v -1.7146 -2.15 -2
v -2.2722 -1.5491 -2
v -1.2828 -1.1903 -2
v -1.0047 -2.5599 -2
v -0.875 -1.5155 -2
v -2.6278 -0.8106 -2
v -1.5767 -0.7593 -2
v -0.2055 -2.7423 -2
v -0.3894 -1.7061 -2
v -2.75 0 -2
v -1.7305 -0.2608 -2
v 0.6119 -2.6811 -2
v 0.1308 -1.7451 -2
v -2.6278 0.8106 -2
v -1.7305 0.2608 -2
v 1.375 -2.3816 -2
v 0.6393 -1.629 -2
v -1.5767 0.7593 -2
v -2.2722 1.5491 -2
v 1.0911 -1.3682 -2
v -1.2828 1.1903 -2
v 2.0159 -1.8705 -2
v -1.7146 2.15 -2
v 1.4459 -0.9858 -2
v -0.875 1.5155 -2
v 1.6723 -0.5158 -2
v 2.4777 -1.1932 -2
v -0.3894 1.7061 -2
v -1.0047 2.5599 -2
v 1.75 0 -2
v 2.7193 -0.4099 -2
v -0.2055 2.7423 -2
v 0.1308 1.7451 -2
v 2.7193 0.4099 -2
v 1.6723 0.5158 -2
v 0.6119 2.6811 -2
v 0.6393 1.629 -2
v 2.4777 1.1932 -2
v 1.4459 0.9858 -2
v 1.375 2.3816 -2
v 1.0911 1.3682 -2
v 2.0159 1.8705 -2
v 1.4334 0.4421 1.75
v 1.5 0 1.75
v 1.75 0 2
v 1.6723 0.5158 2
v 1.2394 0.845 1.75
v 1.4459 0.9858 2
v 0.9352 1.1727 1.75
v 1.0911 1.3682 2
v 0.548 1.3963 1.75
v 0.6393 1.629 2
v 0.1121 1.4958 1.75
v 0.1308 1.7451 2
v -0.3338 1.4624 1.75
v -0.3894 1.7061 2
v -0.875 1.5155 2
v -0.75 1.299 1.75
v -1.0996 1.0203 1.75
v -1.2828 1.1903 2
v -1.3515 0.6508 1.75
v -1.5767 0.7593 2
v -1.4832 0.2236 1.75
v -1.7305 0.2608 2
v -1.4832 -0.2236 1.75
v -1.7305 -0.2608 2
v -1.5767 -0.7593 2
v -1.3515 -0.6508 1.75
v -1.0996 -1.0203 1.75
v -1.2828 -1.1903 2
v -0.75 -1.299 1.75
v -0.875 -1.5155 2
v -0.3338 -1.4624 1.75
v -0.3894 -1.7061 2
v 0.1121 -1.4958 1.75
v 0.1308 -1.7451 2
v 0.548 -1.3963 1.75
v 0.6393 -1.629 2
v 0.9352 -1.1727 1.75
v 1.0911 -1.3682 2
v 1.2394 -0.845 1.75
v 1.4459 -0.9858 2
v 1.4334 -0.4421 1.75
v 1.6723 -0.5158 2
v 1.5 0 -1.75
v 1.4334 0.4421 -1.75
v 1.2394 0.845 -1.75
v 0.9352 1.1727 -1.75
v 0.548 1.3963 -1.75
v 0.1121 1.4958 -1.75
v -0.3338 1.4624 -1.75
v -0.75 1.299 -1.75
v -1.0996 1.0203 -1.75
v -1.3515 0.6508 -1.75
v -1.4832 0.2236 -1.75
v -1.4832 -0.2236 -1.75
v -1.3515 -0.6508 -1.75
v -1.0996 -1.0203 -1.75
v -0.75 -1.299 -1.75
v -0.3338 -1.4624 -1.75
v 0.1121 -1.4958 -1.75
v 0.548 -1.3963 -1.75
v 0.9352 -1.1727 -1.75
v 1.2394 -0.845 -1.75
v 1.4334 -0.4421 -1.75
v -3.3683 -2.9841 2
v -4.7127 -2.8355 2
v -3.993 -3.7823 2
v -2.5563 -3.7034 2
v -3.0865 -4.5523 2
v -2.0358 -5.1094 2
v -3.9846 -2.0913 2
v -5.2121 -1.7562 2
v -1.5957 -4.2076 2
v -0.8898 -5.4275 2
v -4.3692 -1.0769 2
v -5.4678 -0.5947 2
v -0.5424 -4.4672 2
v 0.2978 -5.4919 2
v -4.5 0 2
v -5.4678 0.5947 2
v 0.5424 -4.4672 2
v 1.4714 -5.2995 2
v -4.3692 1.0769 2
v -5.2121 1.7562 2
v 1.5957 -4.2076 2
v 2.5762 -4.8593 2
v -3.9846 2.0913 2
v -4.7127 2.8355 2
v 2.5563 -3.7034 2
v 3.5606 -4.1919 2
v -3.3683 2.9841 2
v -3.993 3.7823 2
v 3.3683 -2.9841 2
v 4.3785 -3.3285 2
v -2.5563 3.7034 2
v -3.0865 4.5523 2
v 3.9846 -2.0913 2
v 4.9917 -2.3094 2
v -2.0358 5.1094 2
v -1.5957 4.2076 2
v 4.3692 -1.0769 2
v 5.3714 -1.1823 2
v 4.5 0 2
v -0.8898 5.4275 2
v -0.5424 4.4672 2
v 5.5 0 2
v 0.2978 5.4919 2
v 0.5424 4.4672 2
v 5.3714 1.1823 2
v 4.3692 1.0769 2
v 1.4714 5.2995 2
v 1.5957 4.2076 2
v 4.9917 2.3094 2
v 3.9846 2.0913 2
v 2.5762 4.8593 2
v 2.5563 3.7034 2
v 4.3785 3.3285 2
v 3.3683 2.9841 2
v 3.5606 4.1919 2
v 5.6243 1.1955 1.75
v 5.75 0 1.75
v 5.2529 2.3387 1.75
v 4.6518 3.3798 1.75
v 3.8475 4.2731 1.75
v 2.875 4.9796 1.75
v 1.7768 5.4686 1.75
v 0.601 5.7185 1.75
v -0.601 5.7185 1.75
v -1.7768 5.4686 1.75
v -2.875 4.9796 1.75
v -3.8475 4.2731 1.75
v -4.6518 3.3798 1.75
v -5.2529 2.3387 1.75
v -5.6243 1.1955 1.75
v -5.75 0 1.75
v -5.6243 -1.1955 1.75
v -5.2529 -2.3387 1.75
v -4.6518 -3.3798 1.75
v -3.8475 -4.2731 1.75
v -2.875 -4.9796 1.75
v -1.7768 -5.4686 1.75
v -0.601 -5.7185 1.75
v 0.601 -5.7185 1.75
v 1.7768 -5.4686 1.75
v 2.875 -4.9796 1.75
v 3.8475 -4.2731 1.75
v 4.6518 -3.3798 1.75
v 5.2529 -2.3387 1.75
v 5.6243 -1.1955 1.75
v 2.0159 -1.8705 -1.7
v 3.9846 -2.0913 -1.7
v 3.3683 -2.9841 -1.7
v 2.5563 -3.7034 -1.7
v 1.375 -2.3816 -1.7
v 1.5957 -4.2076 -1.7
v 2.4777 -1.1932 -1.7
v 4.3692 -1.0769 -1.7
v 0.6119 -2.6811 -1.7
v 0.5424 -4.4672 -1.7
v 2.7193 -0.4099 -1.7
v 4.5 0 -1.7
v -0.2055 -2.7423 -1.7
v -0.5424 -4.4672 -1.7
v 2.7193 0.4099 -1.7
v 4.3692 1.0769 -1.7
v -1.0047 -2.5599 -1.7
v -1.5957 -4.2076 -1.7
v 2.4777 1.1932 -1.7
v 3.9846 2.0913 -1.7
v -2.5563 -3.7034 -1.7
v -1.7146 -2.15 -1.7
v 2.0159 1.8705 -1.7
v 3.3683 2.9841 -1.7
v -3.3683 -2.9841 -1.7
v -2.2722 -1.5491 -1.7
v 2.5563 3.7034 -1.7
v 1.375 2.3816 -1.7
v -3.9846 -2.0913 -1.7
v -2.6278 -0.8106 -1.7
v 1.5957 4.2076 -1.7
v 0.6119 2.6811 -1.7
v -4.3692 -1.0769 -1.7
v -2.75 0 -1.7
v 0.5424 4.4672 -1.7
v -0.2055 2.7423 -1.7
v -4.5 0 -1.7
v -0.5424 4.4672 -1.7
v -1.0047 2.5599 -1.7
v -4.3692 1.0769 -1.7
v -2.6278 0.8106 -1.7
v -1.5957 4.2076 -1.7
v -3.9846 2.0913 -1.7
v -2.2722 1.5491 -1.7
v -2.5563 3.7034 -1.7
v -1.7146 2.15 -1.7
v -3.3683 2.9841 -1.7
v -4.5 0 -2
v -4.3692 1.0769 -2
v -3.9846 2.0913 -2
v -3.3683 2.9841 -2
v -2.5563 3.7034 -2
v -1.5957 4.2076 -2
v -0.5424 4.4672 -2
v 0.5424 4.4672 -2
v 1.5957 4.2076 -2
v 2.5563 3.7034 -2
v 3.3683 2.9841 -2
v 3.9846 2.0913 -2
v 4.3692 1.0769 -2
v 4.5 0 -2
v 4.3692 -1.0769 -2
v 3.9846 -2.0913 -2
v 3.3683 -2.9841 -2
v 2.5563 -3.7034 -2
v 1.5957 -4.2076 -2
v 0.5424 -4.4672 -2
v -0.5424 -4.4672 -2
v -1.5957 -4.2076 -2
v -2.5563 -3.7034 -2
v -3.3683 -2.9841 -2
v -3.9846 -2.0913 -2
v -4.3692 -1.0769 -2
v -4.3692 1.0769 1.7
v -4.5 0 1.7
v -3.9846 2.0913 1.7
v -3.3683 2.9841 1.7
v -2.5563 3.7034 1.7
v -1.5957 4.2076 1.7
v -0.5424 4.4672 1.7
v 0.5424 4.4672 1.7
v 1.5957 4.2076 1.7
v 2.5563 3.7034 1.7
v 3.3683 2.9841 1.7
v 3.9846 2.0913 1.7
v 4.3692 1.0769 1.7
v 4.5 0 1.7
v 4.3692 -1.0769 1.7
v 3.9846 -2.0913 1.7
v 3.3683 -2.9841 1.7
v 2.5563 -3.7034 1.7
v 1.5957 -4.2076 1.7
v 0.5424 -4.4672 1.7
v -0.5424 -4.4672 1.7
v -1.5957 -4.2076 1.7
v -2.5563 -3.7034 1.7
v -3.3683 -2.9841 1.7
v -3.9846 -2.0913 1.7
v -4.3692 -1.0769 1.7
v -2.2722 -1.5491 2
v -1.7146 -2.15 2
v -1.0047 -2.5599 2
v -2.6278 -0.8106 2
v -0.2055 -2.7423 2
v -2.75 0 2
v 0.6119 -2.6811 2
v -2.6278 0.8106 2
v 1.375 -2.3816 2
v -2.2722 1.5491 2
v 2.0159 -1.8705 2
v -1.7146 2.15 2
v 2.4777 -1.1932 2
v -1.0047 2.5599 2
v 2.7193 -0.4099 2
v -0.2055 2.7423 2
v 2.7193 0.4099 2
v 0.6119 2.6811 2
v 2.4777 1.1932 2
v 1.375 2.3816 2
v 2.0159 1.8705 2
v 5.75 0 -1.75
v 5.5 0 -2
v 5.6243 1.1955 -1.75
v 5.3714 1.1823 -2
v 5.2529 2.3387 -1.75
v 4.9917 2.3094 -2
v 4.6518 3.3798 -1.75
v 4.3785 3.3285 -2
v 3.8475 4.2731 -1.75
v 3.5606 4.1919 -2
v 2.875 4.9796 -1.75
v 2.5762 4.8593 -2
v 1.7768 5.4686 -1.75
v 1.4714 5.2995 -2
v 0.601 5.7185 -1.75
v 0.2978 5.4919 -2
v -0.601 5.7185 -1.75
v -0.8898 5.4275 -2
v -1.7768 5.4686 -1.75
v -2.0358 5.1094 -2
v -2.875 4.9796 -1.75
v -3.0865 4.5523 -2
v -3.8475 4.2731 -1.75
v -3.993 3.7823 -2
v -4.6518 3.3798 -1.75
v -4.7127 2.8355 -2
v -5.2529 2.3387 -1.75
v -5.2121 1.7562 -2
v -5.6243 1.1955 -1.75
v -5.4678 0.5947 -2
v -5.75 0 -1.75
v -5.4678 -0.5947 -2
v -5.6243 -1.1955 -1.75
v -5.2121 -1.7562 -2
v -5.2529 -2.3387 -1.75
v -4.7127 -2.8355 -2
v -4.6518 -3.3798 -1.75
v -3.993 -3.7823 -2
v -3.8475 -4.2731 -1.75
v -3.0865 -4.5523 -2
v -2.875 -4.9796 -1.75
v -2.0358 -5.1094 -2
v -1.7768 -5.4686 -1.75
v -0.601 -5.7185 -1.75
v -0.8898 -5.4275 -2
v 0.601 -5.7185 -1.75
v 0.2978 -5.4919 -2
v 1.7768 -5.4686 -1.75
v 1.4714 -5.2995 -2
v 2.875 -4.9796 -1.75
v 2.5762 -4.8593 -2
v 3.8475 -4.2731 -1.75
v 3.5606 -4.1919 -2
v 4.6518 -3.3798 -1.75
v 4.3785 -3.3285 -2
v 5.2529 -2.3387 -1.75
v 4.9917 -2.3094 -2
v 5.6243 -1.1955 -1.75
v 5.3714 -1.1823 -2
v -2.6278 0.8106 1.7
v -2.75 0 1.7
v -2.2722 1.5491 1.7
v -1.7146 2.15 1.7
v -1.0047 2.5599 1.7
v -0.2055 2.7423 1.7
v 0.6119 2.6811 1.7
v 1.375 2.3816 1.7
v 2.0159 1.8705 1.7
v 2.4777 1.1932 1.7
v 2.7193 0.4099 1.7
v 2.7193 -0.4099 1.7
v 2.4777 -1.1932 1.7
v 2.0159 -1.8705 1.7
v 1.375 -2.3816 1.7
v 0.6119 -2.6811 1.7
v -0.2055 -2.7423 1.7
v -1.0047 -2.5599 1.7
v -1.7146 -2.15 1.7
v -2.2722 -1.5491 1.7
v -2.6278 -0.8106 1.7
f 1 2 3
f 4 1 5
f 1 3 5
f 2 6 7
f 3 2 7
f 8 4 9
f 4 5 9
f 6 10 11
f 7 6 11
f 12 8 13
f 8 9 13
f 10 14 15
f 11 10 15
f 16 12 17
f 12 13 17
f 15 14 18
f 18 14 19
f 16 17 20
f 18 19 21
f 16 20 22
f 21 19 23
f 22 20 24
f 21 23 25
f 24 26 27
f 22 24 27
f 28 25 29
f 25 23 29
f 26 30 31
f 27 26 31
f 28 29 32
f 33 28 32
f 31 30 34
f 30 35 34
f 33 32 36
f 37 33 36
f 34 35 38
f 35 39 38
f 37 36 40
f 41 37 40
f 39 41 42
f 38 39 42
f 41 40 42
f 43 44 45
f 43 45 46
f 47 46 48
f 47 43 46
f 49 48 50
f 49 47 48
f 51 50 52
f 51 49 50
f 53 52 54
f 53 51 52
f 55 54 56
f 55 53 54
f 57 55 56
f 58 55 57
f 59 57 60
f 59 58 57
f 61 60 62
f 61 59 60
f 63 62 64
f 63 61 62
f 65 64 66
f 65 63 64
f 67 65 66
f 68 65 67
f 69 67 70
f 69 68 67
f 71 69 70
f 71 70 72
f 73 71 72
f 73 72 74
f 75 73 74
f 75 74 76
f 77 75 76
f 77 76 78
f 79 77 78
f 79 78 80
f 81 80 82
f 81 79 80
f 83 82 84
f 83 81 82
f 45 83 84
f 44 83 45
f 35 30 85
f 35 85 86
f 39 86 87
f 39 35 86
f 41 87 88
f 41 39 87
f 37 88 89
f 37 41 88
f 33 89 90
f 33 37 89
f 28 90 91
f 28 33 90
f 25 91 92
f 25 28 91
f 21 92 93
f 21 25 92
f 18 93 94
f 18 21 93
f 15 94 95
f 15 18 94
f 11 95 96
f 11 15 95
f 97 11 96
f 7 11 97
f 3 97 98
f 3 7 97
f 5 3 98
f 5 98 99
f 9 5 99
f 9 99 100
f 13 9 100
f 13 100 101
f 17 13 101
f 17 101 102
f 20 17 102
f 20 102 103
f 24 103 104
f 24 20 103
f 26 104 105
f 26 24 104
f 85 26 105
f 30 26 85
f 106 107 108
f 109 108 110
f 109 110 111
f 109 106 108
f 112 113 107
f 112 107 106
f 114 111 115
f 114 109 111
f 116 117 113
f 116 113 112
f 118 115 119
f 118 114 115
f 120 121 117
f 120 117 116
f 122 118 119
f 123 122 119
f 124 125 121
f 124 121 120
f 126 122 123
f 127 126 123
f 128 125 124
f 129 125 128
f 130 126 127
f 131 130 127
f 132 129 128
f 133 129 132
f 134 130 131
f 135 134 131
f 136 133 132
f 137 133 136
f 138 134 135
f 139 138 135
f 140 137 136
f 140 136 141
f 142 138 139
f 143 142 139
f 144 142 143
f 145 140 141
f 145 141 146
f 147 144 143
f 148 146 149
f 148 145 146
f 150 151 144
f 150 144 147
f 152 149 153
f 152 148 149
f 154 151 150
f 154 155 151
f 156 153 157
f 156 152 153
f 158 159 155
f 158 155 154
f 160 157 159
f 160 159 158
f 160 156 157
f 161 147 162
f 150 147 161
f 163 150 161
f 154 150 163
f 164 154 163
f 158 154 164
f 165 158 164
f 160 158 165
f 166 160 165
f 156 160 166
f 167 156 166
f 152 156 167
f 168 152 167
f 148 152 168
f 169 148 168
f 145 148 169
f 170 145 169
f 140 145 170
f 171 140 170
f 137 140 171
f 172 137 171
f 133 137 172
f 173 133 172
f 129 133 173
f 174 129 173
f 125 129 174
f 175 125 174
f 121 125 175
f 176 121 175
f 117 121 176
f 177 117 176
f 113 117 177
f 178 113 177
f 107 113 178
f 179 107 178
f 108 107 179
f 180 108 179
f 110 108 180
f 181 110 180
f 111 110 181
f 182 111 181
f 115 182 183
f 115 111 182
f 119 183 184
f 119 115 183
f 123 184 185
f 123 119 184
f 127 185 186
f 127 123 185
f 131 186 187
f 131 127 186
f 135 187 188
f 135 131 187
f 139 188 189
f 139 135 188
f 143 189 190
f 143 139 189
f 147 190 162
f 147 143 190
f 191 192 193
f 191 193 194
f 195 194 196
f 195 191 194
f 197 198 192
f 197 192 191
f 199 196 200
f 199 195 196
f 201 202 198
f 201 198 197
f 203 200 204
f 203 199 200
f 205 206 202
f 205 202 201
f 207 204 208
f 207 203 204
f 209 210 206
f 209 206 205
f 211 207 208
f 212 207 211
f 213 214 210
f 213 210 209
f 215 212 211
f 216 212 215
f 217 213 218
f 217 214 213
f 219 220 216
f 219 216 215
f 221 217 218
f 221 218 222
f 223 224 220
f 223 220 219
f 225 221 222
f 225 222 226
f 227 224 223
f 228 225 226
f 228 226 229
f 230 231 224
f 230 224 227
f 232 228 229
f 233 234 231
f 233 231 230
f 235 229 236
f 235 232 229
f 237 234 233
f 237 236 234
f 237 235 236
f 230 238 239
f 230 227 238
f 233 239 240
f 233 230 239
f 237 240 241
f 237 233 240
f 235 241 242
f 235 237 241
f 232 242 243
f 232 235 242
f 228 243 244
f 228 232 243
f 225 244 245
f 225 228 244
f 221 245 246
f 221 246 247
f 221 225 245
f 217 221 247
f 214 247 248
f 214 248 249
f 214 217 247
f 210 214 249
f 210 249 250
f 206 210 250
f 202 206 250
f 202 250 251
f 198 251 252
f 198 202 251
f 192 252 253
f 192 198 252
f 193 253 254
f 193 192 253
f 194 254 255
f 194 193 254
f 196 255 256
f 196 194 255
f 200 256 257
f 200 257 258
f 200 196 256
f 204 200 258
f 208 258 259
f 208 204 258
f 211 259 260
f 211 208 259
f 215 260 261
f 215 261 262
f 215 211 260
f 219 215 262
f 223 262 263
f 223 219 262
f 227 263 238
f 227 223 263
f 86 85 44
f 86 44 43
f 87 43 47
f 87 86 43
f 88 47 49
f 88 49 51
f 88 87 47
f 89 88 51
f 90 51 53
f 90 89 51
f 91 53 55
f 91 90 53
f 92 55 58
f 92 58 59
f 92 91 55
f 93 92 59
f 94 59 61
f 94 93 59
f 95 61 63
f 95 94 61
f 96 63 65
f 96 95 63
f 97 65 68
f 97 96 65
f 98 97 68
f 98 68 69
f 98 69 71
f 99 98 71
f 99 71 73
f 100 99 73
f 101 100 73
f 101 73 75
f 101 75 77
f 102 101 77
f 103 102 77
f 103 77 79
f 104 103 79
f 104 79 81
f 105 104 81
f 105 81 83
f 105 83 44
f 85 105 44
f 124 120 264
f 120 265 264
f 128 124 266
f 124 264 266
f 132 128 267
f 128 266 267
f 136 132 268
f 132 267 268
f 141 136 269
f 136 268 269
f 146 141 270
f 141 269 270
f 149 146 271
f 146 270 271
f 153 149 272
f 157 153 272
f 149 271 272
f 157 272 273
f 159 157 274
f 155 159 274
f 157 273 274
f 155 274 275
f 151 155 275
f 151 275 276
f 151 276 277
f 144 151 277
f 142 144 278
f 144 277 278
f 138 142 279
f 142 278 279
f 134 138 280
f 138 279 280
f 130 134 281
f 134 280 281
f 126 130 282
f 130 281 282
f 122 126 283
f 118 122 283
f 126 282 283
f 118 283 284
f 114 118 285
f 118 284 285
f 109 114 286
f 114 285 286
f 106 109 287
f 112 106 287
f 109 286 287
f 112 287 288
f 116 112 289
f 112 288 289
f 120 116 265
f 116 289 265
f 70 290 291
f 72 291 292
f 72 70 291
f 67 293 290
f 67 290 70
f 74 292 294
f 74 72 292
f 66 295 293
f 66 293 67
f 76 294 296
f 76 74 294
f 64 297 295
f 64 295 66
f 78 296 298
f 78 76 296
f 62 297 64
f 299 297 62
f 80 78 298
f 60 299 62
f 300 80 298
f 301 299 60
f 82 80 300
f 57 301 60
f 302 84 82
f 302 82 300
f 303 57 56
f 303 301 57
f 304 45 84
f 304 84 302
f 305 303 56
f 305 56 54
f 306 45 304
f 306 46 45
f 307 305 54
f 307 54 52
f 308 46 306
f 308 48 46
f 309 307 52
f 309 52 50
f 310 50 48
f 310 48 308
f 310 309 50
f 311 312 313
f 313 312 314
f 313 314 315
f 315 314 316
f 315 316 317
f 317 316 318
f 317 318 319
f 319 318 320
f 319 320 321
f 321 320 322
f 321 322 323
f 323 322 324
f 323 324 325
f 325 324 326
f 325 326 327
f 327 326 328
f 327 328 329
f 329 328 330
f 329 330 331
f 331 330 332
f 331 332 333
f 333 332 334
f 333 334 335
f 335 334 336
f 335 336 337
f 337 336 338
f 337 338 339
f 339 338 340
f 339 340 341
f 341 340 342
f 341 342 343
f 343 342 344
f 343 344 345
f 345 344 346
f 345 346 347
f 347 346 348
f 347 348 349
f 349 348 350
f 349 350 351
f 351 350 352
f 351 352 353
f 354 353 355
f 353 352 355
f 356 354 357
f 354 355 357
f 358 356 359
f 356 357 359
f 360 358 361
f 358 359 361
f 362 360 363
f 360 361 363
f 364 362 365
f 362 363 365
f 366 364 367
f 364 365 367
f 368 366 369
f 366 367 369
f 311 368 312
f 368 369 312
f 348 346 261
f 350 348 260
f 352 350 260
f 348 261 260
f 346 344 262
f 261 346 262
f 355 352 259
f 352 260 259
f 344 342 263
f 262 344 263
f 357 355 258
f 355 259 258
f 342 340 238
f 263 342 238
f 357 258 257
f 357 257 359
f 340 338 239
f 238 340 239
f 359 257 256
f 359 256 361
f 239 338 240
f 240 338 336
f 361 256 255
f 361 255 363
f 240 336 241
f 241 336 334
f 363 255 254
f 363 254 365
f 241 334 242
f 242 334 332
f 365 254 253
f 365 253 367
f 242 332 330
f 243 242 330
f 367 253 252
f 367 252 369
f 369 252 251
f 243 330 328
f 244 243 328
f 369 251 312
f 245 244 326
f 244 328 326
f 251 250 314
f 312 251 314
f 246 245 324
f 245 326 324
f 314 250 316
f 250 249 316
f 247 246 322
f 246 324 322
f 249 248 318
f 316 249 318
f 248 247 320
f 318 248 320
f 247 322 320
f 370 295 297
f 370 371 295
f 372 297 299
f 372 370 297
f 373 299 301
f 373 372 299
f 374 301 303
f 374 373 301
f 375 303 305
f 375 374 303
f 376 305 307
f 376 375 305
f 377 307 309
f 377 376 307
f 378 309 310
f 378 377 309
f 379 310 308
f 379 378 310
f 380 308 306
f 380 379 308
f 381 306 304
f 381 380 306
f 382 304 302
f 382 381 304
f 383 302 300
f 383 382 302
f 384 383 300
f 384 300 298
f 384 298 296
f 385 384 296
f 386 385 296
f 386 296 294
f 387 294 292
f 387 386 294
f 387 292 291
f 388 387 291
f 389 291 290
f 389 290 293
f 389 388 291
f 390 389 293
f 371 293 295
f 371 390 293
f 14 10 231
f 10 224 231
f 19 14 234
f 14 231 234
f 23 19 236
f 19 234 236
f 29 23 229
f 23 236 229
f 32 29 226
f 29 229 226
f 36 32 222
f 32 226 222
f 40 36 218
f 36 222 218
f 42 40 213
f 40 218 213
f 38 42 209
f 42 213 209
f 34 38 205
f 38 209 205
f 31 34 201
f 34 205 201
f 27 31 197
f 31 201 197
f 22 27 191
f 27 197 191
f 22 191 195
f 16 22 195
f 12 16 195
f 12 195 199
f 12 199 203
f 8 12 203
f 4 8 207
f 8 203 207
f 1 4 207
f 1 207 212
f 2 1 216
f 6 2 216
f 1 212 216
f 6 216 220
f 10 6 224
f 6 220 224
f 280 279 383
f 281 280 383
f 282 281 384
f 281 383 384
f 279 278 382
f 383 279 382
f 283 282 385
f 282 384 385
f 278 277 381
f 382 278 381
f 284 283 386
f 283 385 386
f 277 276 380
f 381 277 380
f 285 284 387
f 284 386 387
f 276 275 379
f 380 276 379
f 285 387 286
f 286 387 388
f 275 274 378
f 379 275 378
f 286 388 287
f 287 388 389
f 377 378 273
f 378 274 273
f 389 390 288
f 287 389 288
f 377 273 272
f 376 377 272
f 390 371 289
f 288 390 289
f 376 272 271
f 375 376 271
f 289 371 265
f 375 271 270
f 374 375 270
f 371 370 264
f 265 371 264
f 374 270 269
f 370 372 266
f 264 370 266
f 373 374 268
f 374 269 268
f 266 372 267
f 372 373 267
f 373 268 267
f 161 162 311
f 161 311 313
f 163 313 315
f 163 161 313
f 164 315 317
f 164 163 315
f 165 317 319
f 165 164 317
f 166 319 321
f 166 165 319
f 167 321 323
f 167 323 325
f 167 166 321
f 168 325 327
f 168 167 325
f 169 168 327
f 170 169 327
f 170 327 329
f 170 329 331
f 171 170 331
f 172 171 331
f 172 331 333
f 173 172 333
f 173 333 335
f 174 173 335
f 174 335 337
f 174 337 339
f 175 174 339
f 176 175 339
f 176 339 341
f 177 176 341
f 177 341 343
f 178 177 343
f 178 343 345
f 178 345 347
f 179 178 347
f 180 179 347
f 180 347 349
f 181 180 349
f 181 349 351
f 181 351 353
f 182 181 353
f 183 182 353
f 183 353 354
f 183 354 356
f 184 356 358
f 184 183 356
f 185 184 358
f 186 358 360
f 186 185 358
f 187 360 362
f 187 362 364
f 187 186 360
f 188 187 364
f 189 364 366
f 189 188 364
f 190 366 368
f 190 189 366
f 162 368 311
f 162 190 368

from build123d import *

# Parameters (mm, degrees)
SKETCH1_R           = 5.75
SKETCH1_R_2         = 1.5
BOSS_EXTRUDE1_DEPTH = 2
CHAMFER1_SIZE       = 0.25
SKETCH2_W           = 1.75
SKETCH2_H           = 0.3


with BuildPart() as part:
    # Sketch1 → Boss-Extrude1 (new body, symmetric)
    with BuildSketch(Plane.XY):
        Circle(SKETCH1_R)
        Circle(SKETCH1_R_2, mode=Mode.SUBTRACT)
    extrude(amount=BOSS_EXTRUDE1_DEPTH, both=True)

    # Chamfer1
    chamfer1_edges = [part.edges().sort_by_distance(p)[0] for p in [
        (-5.75, 0, -2),
        (-5.75, 0, 2),
        (-1.5, 0, -2),
        (-1.5, 0, 2),
    ]]
    chamfer(chamfer1_edges, length=CHAMFER1_SIZE)

    # Sketch2 → Cut-Revolve1 (revolve, cut)
    with BuildSketch(Plane(origin=(0, 0, 0), x_dir=(1, 0, 0), z_dir=(0, 1, 0))):
        with Locations((-3.625, -1.85)):
            Rectangle(SKETCH2_W, SKETCH2_H)
    cut_revolve1 = revolve(axis=Axis((0, 0, 0), (0, 0, -1)), mode=Mode.SUBTRACT)

    # Mirror1: Cut-Revolve1 across plane
    add(cut_revolve1.mirror(Plane.XY), mode=Mode.SUBTRACT)


solid = part.part
